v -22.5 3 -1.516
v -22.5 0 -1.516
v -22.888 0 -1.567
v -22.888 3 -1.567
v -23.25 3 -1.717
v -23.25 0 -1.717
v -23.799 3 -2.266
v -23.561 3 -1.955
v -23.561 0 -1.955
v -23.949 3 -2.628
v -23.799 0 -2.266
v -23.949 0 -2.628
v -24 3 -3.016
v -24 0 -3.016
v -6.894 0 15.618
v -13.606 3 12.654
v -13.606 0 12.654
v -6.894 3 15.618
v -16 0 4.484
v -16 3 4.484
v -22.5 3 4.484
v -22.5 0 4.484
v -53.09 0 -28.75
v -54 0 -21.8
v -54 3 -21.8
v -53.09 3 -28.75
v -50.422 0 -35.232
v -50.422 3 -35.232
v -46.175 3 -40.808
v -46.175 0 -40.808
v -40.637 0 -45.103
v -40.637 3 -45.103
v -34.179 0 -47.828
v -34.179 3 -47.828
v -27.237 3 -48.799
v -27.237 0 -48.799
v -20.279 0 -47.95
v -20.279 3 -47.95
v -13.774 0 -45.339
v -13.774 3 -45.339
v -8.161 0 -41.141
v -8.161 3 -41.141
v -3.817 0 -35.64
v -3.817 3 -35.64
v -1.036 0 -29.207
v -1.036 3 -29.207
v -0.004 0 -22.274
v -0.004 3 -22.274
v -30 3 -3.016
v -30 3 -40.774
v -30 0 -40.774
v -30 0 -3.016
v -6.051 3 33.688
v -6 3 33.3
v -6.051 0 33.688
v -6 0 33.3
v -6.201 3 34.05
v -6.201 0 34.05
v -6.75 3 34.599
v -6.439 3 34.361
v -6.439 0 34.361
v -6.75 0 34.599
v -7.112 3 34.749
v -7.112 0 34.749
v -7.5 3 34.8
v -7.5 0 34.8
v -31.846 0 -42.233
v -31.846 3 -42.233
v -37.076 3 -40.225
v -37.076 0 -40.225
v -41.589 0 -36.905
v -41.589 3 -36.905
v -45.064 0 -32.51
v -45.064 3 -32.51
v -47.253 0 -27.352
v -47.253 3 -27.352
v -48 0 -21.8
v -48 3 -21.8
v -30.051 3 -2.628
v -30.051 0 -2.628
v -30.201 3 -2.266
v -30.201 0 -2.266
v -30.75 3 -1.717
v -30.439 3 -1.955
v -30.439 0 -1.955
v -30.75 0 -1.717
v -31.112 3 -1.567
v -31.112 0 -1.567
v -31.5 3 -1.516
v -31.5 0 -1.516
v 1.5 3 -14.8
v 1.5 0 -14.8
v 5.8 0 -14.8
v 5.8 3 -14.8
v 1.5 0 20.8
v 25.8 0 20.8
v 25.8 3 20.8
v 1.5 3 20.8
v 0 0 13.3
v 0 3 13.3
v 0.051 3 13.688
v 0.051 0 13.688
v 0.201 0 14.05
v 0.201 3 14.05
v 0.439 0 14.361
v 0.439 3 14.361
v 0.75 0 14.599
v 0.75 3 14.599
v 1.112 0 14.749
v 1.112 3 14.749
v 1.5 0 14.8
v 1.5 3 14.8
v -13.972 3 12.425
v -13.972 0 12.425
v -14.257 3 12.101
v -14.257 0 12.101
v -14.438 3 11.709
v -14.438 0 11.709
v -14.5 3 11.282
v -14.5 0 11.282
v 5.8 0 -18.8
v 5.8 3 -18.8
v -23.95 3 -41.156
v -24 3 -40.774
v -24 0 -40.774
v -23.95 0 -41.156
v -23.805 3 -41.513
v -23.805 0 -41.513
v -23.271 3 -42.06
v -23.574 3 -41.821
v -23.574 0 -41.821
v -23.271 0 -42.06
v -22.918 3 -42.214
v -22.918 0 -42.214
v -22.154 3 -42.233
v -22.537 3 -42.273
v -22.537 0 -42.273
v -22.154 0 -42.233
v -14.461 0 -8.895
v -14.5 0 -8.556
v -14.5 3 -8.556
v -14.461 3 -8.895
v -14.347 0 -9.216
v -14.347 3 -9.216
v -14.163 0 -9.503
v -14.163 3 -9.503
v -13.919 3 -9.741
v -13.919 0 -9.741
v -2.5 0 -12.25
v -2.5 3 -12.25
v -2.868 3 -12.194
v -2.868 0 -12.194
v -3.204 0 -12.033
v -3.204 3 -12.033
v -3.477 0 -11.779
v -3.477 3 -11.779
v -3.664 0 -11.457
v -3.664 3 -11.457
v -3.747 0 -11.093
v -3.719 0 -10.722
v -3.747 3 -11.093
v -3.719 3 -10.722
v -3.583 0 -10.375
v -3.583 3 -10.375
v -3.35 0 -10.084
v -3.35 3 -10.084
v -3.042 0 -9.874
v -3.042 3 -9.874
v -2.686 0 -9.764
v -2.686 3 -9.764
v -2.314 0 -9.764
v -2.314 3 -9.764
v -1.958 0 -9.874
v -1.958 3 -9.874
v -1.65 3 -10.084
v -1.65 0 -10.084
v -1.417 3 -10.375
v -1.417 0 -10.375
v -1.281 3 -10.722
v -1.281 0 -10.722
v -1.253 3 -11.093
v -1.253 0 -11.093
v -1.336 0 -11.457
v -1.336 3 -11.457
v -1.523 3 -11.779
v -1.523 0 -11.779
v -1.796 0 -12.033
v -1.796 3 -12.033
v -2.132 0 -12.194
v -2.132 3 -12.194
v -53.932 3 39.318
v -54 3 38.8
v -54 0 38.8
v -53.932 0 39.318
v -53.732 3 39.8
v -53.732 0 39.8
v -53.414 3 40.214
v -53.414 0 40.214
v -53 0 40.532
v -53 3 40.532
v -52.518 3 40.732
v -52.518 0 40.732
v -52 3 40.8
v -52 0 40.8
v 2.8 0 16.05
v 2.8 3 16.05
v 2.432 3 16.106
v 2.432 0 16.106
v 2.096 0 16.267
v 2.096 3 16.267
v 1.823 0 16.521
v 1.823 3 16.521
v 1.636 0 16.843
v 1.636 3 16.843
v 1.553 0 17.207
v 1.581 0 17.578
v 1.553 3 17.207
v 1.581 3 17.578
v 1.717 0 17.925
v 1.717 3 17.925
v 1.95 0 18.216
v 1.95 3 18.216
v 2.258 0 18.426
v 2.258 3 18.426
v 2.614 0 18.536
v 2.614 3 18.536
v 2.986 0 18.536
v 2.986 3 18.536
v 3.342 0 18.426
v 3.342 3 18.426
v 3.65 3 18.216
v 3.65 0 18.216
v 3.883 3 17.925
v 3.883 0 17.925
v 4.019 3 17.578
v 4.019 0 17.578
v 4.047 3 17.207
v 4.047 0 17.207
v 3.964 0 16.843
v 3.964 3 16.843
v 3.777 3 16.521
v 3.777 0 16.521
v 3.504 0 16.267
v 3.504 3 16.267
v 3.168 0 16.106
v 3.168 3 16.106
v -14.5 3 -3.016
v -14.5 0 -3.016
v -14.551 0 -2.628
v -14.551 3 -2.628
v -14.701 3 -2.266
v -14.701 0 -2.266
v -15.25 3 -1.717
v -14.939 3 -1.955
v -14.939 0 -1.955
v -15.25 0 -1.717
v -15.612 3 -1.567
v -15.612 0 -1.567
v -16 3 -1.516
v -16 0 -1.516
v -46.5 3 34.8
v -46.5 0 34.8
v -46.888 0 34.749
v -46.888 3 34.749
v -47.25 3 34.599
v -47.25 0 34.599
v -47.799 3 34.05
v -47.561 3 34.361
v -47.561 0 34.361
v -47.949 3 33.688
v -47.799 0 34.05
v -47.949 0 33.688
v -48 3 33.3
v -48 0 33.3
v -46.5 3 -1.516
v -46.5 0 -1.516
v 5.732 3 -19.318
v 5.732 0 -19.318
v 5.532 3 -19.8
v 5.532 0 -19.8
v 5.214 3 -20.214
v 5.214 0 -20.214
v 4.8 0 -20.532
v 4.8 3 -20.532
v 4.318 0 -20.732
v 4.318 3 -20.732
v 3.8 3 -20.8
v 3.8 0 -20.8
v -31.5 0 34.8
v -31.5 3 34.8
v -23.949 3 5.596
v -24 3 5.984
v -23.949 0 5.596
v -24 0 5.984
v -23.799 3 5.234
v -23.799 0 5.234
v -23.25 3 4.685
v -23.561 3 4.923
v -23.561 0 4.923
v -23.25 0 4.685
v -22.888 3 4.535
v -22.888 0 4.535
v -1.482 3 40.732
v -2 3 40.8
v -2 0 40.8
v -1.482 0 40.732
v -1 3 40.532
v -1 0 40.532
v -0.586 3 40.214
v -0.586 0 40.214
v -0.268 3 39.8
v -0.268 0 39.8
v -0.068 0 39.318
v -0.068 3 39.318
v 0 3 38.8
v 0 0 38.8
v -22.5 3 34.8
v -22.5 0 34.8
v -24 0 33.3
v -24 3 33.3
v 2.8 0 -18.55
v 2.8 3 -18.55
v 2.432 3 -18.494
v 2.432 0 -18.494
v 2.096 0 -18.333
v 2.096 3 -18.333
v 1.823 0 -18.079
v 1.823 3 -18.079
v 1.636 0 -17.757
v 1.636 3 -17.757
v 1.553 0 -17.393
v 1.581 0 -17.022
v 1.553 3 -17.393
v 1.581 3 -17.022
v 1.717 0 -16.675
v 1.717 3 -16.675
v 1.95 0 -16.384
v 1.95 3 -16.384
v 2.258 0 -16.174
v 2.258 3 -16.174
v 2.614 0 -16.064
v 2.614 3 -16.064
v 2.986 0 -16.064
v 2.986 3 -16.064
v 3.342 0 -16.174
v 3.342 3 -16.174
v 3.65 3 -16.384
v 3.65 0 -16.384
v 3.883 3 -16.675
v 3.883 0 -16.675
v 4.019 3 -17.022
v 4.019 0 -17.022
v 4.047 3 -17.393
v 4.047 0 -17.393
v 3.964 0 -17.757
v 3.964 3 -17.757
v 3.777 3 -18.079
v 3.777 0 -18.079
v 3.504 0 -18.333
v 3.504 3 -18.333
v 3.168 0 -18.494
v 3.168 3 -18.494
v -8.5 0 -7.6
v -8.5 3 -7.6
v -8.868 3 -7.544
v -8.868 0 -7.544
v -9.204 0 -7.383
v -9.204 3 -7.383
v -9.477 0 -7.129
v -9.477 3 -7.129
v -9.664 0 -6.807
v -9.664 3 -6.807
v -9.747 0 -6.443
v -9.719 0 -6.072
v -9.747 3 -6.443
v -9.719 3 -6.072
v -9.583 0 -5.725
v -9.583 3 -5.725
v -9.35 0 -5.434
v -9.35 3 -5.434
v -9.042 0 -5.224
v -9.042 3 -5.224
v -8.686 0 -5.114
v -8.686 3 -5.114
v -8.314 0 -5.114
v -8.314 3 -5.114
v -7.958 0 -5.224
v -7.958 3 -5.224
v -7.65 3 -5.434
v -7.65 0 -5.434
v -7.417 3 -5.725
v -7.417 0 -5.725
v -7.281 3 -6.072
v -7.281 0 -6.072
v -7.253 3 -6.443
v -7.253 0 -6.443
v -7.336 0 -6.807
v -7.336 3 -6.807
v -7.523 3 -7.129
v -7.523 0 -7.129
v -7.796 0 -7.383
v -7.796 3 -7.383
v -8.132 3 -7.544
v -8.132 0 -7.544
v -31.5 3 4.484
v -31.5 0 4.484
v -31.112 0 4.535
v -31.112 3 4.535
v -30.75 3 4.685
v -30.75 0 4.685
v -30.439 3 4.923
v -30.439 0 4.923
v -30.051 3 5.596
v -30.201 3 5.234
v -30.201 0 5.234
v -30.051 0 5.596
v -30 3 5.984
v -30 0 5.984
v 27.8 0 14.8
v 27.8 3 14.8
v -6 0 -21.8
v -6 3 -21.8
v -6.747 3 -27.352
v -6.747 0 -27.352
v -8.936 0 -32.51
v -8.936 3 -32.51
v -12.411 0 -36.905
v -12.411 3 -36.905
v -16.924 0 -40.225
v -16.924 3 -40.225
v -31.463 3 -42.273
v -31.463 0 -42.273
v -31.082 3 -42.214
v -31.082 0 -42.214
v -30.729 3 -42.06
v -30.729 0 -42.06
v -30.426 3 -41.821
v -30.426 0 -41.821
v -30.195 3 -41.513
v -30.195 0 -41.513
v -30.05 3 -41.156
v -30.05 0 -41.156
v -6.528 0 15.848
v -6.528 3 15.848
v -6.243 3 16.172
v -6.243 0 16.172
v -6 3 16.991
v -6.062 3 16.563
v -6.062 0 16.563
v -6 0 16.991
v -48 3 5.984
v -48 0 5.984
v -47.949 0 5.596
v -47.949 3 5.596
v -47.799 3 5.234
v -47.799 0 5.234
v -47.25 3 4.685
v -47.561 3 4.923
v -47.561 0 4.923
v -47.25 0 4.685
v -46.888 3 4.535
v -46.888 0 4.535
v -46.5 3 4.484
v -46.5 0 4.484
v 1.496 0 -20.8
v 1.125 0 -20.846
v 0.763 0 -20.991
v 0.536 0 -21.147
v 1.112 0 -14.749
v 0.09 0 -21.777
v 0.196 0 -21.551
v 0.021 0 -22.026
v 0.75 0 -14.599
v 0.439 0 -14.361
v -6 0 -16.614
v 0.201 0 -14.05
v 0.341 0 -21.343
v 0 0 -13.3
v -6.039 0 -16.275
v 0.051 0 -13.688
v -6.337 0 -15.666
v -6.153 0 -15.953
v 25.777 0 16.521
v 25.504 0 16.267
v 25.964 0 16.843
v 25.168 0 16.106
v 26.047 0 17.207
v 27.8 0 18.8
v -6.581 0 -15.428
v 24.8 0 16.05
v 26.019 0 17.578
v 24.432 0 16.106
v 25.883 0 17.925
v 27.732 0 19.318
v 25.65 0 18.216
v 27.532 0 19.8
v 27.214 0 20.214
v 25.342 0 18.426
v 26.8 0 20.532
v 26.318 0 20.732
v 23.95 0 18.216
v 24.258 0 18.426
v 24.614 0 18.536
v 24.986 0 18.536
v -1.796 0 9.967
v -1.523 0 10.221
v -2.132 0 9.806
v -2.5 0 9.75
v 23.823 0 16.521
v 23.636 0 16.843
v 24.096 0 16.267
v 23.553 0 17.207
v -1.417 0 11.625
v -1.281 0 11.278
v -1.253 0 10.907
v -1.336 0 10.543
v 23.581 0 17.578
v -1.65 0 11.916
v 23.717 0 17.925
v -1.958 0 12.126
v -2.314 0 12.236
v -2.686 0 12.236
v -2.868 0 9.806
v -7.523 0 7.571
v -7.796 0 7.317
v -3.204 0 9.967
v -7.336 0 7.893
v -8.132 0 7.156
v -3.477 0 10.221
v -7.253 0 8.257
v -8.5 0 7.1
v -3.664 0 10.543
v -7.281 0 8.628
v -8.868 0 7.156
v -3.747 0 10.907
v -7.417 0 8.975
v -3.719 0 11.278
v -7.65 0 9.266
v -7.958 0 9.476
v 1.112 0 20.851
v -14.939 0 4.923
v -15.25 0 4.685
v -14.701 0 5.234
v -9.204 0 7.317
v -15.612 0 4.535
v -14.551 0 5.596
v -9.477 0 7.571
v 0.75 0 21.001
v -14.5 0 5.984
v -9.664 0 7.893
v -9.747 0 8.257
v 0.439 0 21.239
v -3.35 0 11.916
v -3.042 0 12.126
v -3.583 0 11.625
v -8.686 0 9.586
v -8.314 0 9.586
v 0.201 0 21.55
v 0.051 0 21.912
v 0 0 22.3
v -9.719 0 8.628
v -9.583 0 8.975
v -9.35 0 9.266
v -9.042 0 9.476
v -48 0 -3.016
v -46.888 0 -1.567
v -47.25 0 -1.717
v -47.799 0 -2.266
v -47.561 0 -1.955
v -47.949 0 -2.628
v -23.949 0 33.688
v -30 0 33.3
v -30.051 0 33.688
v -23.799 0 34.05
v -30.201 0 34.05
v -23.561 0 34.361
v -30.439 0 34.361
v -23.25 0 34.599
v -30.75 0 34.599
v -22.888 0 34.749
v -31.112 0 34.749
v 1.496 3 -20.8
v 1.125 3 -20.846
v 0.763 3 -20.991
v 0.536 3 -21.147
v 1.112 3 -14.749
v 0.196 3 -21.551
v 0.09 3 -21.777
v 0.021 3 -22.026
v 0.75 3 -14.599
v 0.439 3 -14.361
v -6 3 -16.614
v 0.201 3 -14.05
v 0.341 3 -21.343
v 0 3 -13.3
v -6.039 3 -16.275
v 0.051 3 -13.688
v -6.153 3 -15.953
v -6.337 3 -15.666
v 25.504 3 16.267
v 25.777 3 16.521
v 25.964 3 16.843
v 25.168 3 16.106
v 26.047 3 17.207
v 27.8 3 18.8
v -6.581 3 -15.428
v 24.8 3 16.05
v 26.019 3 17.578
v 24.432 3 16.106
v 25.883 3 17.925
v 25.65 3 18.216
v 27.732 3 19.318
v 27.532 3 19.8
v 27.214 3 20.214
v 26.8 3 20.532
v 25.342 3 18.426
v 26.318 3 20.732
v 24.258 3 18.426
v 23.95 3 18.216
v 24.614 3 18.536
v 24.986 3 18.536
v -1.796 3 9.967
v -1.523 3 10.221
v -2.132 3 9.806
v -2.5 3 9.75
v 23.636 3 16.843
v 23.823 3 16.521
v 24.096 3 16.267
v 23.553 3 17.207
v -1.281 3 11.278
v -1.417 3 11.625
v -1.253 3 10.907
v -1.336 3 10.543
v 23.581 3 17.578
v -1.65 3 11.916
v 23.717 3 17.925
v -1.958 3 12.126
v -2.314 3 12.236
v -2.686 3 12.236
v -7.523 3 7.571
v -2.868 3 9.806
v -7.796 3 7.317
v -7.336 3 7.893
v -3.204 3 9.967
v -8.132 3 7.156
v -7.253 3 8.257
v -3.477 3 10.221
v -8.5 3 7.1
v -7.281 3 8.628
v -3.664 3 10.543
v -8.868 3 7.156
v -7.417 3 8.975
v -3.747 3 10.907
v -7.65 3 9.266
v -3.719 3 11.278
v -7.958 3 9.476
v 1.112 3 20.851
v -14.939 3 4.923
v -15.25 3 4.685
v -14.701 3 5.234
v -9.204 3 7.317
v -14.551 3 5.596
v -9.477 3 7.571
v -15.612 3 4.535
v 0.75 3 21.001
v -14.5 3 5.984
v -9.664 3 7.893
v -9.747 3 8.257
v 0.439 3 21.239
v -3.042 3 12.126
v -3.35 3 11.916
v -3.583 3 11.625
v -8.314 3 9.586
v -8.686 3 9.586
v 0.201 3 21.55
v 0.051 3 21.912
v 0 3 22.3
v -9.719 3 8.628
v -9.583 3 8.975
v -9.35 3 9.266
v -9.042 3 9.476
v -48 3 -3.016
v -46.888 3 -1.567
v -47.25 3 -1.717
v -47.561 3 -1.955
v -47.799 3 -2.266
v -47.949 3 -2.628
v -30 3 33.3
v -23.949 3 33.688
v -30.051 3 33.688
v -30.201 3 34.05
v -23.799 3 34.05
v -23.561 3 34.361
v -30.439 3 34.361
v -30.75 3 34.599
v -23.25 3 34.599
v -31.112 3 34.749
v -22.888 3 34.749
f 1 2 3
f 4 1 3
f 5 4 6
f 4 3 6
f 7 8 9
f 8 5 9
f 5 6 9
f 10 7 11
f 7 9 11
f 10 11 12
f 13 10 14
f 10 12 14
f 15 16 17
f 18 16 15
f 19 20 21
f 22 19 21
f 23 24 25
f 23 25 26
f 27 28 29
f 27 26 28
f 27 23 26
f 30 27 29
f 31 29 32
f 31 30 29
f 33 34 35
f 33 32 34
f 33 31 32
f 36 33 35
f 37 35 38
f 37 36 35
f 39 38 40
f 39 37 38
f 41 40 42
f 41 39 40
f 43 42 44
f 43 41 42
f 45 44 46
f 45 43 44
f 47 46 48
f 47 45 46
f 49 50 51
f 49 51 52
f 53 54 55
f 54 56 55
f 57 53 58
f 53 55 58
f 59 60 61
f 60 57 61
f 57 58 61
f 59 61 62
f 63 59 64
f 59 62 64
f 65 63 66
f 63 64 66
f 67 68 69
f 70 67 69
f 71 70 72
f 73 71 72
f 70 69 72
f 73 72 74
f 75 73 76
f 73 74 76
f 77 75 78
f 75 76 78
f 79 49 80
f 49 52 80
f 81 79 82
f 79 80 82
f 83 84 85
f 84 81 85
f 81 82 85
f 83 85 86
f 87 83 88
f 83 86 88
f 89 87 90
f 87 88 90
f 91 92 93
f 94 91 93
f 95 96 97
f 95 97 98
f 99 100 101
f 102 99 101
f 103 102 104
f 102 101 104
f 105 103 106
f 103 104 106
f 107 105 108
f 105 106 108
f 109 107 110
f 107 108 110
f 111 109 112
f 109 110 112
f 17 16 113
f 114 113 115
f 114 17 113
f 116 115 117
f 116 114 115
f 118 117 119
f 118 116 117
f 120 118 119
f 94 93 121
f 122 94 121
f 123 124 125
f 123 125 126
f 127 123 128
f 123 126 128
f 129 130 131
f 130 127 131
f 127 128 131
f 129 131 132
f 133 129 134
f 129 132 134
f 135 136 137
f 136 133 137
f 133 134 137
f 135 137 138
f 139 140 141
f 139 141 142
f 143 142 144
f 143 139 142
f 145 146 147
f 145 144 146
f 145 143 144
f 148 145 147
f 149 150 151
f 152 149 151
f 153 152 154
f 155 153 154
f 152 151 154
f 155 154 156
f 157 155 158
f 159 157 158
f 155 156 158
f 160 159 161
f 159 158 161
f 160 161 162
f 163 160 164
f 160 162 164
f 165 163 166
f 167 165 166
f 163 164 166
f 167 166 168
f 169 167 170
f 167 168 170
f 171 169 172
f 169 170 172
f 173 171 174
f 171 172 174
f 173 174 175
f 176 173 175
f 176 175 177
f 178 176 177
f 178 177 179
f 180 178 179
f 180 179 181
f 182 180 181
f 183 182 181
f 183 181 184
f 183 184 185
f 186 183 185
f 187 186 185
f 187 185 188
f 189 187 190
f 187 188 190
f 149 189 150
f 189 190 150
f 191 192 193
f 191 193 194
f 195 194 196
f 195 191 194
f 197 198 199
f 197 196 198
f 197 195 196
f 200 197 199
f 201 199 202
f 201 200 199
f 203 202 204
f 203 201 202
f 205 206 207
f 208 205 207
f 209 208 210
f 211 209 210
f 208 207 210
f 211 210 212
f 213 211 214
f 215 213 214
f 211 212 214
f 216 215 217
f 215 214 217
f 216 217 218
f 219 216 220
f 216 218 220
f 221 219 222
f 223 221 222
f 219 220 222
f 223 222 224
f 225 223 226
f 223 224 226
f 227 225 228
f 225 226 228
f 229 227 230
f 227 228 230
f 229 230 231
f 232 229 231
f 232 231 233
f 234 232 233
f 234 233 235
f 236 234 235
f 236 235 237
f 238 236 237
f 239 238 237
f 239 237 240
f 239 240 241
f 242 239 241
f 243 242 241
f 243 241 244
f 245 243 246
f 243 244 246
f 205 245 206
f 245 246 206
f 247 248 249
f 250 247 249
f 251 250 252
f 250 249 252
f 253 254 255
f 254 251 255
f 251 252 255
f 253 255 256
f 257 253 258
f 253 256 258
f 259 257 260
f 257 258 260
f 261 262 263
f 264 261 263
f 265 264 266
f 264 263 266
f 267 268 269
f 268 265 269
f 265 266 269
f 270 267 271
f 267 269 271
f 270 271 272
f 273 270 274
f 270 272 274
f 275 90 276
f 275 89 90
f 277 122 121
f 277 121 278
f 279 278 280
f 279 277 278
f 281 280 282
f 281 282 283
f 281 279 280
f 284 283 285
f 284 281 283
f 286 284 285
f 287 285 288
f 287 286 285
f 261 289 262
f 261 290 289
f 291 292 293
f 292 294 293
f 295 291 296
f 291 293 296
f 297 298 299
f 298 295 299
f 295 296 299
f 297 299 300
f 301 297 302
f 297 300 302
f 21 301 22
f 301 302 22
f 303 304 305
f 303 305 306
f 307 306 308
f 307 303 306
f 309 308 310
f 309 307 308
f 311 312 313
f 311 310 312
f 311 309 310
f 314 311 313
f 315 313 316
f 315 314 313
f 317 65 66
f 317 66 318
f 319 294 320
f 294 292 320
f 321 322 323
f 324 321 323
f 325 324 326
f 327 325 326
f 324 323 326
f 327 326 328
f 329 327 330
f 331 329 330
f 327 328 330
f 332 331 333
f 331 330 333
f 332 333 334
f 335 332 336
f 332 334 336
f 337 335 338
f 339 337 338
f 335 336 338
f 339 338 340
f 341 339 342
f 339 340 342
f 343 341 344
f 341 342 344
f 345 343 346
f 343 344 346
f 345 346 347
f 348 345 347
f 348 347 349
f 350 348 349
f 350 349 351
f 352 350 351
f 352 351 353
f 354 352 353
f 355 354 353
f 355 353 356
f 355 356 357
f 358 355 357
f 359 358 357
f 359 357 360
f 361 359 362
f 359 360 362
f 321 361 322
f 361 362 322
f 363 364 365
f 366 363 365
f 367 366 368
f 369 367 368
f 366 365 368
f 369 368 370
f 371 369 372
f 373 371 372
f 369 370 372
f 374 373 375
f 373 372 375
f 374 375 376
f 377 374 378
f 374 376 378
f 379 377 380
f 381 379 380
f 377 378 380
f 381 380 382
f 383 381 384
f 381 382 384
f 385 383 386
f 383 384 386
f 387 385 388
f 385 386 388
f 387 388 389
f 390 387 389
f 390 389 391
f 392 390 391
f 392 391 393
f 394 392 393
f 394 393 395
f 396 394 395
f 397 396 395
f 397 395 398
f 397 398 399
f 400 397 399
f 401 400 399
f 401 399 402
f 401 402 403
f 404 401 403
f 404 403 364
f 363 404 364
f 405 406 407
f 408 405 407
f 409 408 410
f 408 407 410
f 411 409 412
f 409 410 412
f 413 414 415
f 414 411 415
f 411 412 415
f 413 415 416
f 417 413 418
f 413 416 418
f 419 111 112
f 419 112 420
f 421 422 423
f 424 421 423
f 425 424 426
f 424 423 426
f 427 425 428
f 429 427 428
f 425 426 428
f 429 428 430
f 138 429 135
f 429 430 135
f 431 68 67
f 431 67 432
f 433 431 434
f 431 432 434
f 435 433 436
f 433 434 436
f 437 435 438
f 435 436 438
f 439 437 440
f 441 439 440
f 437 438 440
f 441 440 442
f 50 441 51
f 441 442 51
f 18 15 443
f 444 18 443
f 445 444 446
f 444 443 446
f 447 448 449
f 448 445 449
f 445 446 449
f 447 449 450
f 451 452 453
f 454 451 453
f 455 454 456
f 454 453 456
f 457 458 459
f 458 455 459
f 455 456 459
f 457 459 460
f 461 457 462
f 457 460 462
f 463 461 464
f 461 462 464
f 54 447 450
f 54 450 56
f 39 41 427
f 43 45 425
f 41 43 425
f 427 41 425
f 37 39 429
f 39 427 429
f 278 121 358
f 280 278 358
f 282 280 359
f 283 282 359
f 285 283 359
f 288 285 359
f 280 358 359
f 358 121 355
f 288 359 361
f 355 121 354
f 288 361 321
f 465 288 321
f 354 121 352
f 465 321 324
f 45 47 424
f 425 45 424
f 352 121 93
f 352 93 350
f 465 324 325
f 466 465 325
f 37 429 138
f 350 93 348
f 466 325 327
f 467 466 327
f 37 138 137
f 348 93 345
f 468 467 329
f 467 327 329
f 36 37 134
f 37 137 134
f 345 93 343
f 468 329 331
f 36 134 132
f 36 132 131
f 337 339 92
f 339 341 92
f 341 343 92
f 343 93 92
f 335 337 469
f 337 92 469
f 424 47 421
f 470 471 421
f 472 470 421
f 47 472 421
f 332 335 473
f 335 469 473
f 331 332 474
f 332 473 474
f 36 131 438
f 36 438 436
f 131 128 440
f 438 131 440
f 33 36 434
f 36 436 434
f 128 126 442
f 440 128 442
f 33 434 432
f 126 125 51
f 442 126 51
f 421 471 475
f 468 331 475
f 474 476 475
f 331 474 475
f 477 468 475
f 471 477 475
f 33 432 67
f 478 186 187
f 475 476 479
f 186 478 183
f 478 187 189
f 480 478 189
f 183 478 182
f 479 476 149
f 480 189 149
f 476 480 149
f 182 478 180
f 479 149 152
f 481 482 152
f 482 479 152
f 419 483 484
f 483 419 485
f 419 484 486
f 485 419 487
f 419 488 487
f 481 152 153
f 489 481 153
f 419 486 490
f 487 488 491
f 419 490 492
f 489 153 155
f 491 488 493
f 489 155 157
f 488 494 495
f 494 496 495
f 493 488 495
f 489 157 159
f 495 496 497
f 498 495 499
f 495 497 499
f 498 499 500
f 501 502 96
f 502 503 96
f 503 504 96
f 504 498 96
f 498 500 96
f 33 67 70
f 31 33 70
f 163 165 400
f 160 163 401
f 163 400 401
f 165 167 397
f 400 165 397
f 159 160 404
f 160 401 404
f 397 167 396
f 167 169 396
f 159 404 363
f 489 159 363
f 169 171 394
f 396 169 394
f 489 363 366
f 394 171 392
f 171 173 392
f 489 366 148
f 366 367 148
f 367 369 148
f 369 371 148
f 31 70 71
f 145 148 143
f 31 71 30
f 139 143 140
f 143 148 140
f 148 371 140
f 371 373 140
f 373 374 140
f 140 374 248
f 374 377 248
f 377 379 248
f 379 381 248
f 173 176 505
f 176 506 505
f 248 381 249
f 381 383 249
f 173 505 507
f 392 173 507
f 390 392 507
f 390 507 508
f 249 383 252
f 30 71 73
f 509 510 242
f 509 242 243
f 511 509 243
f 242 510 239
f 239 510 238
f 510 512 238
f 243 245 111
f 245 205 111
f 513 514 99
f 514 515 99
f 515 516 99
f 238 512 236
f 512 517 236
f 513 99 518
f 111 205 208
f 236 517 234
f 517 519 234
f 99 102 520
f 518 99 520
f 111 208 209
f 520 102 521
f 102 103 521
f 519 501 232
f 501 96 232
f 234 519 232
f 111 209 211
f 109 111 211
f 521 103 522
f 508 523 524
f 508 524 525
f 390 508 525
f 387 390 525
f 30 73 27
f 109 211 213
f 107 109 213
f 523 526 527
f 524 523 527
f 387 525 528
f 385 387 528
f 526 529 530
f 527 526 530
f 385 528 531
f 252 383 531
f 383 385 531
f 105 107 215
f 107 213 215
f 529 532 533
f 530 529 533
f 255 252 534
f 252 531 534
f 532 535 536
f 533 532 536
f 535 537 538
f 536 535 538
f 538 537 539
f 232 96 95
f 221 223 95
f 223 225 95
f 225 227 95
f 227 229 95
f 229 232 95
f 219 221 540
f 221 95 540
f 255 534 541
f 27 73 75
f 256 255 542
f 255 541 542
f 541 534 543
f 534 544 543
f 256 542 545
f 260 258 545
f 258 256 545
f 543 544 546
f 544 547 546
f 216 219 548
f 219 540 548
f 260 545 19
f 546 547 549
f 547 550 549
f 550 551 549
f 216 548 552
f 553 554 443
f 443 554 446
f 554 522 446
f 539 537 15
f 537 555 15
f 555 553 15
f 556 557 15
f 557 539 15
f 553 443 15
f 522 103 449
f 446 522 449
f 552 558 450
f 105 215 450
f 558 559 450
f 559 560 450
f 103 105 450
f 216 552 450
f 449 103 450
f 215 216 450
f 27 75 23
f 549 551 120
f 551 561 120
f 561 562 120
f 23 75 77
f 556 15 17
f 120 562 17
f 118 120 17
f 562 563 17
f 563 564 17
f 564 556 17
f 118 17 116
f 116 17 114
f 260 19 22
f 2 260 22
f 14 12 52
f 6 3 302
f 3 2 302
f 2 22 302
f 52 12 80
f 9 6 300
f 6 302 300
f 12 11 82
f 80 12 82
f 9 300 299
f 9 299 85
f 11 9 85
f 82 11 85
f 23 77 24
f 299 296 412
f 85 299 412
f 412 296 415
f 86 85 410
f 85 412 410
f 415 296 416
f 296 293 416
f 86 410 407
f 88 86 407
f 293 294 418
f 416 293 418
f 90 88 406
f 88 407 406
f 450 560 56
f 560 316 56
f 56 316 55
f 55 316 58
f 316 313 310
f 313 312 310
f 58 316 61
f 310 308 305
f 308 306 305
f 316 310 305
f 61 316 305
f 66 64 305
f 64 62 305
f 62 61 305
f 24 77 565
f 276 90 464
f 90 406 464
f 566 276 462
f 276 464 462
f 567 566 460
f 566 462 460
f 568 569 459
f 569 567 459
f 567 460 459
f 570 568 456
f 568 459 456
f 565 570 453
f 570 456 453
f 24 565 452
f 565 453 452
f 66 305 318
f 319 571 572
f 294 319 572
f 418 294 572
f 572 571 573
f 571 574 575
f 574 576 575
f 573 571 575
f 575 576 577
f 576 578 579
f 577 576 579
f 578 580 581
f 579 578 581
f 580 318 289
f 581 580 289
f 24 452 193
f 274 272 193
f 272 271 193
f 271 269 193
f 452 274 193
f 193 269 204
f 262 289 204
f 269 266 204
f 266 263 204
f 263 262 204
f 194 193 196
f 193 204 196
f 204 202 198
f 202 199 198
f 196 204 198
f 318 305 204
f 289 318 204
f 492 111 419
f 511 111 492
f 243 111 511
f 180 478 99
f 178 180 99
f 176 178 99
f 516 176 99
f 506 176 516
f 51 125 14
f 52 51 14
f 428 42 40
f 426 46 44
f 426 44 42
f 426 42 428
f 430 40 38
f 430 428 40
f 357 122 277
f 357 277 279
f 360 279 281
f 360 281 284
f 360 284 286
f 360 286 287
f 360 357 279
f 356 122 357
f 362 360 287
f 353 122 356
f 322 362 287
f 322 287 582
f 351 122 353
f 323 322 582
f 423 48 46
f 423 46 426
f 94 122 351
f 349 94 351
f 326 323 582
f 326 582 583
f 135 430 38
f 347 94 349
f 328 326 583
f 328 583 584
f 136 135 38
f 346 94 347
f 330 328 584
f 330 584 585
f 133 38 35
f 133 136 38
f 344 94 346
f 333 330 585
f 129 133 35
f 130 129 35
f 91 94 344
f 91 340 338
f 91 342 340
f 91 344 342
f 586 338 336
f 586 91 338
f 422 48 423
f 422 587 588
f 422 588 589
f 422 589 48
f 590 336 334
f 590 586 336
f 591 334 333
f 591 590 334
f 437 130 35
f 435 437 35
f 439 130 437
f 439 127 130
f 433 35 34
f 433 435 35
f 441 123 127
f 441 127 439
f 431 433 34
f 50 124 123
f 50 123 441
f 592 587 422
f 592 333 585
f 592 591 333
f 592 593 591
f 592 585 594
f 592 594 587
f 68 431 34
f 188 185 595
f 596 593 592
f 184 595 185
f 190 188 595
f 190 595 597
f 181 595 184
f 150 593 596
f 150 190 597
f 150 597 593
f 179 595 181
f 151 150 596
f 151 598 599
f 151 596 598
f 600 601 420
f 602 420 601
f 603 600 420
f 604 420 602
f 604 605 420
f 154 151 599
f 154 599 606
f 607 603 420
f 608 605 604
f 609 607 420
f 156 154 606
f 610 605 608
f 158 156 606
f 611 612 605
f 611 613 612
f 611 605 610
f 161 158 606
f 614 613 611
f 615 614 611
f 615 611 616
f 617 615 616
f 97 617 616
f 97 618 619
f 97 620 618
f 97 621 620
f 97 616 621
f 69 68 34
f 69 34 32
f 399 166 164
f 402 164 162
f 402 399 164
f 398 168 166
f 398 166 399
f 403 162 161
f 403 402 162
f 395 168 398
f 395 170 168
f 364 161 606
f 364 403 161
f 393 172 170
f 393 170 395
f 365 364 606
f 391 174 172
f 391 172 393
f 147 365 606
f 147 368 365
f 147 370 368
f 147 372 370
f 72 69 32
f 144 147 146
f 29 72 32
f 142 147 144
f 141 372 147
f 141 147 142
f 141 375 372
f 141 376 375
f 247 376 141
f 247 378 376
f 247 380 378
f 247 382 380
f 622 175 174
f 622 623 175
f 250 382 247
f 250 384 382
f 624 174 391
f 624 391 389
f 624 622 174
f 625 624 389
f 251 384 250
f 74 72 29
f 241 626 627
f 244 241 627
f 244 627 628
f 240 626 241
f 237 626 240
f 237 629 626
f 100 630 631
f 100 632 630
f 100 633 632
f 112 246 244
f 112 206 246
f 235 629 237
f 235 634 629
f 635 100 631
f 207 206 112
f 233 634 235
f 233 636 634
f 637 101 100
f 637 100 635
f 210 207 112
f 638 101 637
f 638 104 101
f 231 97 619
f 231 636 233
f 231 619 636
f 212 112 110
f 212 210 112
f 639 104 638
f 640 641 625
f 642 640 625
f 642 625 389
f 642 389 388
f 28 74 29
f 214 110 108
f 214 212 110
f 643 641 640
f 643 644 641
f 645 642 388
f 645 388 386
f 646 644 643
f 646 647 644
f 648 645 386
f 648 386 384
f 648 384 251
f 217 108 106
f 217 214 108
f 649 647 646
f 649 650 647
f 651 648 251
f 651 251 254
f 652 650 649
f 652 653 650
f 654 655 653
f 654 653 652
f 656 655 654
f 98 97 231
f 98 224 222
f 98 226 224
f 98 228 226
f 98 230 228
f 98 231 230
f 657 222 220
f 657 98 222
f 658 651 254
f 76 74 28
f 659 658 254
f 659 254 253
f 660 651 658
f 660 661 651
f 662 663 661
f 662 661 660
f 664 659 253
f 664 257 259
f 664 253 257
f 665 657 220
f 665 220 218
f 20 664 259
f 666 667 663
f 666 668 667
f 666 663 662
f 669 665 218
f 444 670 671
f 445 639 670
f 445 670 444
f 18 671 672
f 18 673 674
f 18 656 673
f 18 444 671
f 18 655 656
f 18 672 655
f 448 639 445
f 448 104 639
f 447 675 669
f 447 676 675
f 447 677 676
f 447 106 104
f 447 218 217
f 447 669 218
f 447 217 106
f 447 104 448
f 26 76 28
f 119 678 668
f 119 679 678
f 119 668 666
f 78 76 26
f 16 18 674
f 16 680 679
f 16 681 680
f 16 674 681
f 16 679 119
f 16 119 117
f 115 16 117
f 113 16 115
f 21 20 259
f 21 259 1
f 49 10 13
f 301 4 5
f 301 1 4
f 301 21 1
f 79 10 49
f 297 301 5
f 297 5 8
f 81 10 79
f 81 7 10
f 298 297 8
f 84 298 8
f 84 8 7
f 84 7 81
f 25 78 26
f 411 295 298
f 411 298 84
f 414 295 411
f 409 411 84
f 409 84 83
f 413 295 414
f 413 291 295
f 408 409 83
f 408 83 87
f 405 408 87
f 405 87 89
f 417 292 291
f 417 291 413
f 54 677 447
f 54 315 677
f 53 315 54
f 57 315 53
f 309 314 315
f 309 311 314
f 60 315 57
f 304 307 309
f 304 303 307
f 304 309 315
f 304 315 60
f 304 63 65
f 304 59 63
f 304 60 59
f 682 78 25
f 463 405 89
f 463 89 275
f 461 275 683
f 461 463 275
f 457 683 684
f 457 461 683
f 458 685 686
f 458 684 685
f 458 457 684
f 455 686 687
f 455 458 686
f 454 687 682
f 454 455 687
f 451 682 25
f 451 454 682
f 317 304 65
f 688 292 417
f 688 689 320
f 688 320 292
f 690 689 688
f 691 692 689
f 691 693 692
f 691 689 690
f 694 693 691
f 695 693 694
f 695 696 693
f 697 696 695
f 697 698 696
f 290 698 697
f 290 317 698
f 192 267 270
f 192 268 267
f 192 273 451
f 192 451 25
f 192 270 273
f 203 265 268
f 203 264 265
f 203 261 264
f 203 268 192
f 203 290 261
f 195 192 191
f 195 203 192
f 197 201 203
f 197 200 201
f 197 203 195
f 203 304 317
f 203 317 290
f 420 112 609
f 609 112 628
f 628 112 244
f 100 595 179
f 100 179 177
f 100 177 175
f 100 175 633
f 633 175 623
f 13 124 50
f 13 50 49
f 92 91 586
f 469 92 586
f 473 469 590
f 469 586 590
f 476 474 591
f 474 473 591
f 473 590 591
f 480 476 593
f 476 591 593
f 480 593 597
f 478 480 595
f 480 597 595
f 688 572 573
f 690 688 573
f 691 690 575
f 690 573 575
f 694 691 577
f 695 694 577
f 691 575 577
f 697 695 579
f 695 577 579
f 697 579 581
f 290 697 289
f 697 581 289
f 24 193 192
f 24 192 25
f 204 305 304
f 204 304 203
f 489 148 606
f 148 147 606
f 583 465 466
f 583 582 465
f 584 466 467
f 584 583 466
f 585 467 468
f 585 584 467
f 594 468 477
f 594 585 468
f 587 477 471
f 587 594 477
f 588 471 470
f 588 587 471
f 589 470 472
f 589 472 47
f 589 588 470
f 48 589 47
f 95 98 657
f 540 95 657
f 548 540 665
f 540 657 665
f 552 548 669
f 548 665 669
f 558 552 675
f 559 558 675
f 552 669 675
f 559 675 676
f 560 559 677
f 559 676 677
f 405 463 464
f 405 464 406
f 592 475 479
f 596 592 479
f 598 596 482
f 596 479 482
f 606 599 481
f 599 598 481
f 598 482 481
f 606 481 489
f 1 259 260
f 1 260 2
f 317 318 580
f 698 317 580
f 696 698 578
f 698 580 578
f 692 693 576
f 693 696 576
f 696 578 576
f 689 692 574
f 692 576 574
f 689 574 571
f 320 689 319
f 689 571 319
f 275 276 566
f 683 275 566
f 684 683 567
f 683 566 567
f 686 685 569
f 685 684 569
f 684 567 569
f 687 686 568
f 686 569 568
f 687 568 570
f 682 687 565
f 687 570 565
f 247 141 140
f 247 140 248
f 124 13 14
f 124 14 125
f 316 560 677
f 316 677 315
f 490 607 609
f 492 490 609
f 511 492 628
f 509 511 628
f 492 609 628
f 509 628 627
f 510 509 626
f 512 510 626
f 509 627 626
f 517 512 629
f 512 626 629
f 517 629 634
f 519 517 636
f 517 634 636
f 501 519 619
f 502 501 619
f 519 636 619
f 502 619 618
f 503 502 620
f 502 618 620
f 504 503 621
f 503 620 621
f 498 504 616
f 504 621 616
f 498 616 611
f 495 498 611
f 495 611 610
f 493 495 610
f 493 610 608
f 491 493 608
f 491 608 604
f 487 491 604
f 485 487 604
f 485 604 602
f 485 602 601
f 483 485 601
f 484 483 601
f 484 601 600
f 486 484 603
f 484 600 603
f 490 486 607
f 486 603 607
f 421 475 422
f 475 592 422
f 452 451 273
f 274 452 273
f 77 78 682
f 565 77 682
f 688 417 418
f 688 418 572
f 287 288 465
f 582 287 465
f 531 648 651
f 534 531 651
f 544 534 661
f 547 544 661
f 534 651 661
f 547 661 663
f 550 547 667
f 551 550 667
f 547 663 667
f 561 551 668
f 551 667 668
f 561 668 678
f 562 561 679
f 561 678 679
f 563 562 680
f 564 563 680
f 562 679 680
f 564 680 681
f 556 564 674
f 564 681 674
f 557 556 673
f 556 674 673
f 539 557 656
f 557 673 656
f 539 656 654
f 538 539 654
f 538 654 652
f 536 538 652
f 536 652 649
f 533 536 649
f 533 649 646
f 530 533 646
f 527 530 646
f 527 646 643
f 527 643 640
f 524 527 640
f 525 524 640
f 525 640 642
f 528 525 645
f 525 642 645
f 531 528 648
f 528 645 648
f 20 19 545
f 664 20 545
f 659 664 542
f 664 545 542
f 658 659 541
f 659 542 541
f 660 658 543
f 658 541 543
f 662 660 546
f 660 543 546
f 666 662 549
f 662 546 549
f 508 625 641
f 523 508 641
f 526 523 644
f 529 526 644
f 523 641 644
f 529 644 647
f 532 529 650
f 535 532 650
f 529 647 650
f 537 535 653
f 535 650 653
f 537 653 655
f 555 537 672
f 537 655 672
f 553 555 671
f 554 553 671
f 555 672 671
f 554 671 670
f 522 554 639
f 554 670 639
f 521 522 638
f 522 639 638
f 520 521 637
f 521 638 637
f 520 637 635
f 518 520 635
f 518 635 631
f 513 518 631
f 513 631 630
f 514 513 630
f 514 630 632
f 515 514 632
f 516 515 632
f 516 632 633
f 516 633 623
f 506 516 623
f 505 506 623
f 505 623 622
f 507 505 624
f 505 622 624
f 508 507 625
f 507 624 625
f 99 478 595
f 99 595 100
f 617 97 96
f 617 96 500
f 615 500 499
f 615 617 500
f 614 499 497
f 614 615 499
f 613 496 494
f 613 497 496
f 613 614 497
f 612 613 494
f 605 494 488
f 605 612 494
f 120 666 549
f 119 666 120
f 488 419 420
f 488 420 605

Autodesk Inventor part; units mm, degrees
ref_plane "YZ Plane" through (0, 0, 0) normal (1, 0, 0) x (0, 1, 0)
ref_plane "XZ Plane" through (0, 0, 0) normal (0, 1, 0) x (-1, 0, 0)
ref_plane "XY Plane" through (0, 0, 0) normal (0, 0, 1) x (1, 0, 0)
sketch "Sketch1" plane through (0, 0, 0) normal (0, 1, 0) x (-1, 0, 0)
  line L0 (0, 0) -> (0, -14.8)
  line L1 (0, -14.8) -> (-5.8, -14.8)
  line L2 (-5.8, -14.8) -> (-5.8, -20.8)
  line L3 (-5.8, -20.8) -> (0, -20.8)
  line L4 (0, 0) -> (0, 14.8)
  line L5 (0, 14.8) -> (-27.8, 14.8)
  line L6 (-27.8, 14.8) -> (-27.8, 20.8)
  line L7 (-27.8, 20.8) -> (0, 20.8)
  line L8 (0, 20.8) -> (0, 40.8)
  line L9 (0, 40.8) -> (54, 40.8)
  line L10 (0, -20.8) -> (0, -21.8)
  line L11 (54, 40.8) -> (54, -21.8)
  arc A0 (0, -21.8) -> (54, -21.8) centre (27, -21.8) ccw
  line L12 (-27.8, 17.3) -> (2.5, 17.3) construction
  line L13 (2.5, 17.3) -> (2.5, -17.3) construction
  line L14 (2.5, -17.3) -> (-5.8, -17.3) construction
  line L15 (0, 0) -> (2.5, 0) construction
  line L16 (2.5, 0) -> (8.5, 0) construction
  line L17 (8.5, -6.35) -> (8.5, 8.35) construction
  line L18 (-27.8, 14.8) -> (-5.8, -14.8) construction
  line L19 (-16.8, 0) -> (-21.8, 0) construction
  point P0 (-2.8, -17.3)
  point P1 (-2.8, 17.3)
  point P2 (-24.8, 17.3)
  point P3 (2.5, 11)
  point P4 (2.5, -11)
  dimension "d0" = 20
  dimension "d1" = 6
  dimension "d2" = 6
  dimension "d4" = 54
  dimension "d5" = 1
  dimension "d7" = 2.5
  dimension "d8" = 2.5
  dimension "d9" = 5.3
  dimension "d10" = 3
  dimension "d11" = 34.6
  dimension "d12" = 11
  dimension "d13" = 11
  dimension "d14" = 5.3
  dimension "d15" = 22
  dimension "d16" = 3
  dimension "d19" = 6
  dimension "d20" = 14.7
  dimension "d21" = 6.35
  dimension "d53" = 5
extrude "Extrusion1" add sketch "Sketch1" along normal blind 3
hole "Hole1" at (2.8, 0, -17.3) at (2.8, 0, 17.3) at (24.8, 0, 17.3) at (-2.5, 0, 11) at (-2.5, 0, -11) at (-8.5, 0, 8.35) at (-8.5, 0, -6.35) direction (0, 1, 0) diameter 2.5 end through all
fillet "ManufacturingFillet" radius 1.5 4 edges at (0, 1.5, -20.8) (0, 1.5, -14.8) (0, 1.5, 14.8) (0, 1.5, 20.8)
fillet "Fillet2" radius 2 4 edges at (5.8, 1.5, -20.8) (27.8, 1.5, 20.8) (0, 1.5, 40.8) (-54, 1.5, 40.8)
sketch "InteriorSketch" plane through (0, 3, 0) normal (0, 1, 0) x (1, 0, 0)
  arc A0 (-54, -38.8) -> (-52, -40.8) centre (-52, -38.8) ccw projected
  line L0 (-52, -40.8) -> (-2, -40.8) projected
  arc A1 (-2, -40.8) -> (0, -38.8) centre (-2, -38.8) ccw projected
  line L1 (0, -38.8) -> (0, -22.3) projected
  arc A2 (1.5, -20.8) -> (0, -22.3) centre (1.5, -22.3) ccw projected
  line L2 (1.5, -20.8) -> (25.8, -20.8) projected
  arc A3 (25.8, -20.8) -> (27.8, -18.8) centre (25.8, -18.8) ccw projected
  line L3 (27.8, -18.8) -> (27.8, -14.8) projected
  line L4 (27.8, -14.8) -> (1.5, -14.8) projected
  arc A4 (0, -13.3) -> (1.5, -14.8) centre (1.5, -13.3) ccw projected
  line L5 (0, -13.3) -> (0, 13.3) projected
  arc A5 (1.5, 14.8) -> (0, 13.3) centre (1.5, 13.3) ccw projected
  line L6 (1.5, 14.8) -> (5.8, 14.8) projected
  line L7 (5.8, 14.8) -> (5.8, 18.8) projected
  arc A6 (5.8, 18.8) -> (3.8, 20.8) centre (3.8, 18.8) ccw projected
  line L8 (3.8, 20.8) -> (1.4956, 20.8) projected
  arc A7 (-0.0042, 22.2737) -> (1.4956, 20.8) centre (1.4956, 22.3) ccw projected
  arc A8 (-0.0042, 22.2737) -> (-54, 21.8) centre (-27, 21.8) ccw projected
  line L9 (-54, 21.8) -> (-54, -38.8) projected
  circle A9 centre (-8.5, -8.35) radius 1.25 projected
  circle A10 centre (-2.5, -11) radius 1.25 projected
  circle A11 centre (2.8, -17.3) radius 1.25 projected
  circle A12 centre (2.8, 17.3) radius 1.25 projected
  circle A13 centre (24.8, -17.3) radius 1.25 projected
  circle A14 centre (-2.5, 11) radius 1.25 projected
  circle A15 centre (-8.5, 6.35) radius 1.25 projected
  line L10 (-14.5, 9.2909) -> (-14.5, -12.2592)
  line L11 (-14.5, -12.2592) -> (-6, -16.0133)
  line L12 (-6, -16.0133) -> (-6, -34.8)
  line L13 (-6, -34.8) -> (-48, -34.8)
  circle A16 centre (-2.5, 11) radius 1.25 construction
  line L14 (-8.5, 6.35) -> (-2.5, 11) construction
  line L15 (-8.5, -8.35) -> (-2.5, -11) construction
  line L16 (-14.5, 9.2909) -> (-6, 15.8784)
  line L17 (-6, 15.8784) -> (-6, 21.8)
  line L18 (-6, 15.8784) -> (-6, 21.8)
  arc A17 (-6, 21.8) -> (-48, 21.8) centre (-27, 21.8) ccw
  line L19 (-48, 21.8) -> (-48, -34.8)
  line L20 (-6, 21.8) -> (-48, 21.8) construction
  line L21 (-27, -34.8) -> (-27, 42.8) construction
  line L22 (-14.5, -1.4841) -> (-48, -1.4841) construction
  line L23 (-14.5, 1.5159) -> (-24, 1.5159)
  line L24 (-24, 1.5159) -> (-24, 42.5846)
  line L25 (-30, 42.5846) -> (-30, 1.5159)
  line L26 (-30, 1.5159) -> (-48, 1.5159)
  line L27 (-48, -4.4841) -> (-30, -4.4841)
  line L28 (-30, -4.4841) -> (-30, -34.8)
  line L29 (-14.5, -4.4841) -> (-24, -4.4841)
  line L30 (-24, -4.4841) -> (-24, -34.8)
  line L31 (-30, 1.5159) -> (-24, 1.5159) construction
  line L32 (-30, 1.5159) -> (-30, -4.4841) construction
  point P0 (0, 0)
  point P1 (-14.5, -1.4841)
  point P2 (-27, -1.4841)
  point P3 (-30, -1.4841)
  point P4 (-27, 1.5159)
  dimension "d31" = 6
  dimension "d32" = 6
  dimension "d34" = 6
  dimension "d38" = 6
  dimension "d39" = 6
  dimension "d44" = 6
  dimension "d48" = 6
  dimension "d49" = 6
extrude "Extrusion3" cut sketch "InteriorSketch" against normal through all contours L10 L23 L24 A17 L17 L16 | L10 L11 L12 L13 L30 L29 | L25 L26 L19 A17 | L13 L19 L27 L28
fillet "Fillet3" radius 1.5 18 edges at (-24, 1.5, 34.8) (-6, 1.5, 34.8) (-24, 1.5, 4.4841) (-14.5, 1.5, 4.4841) (-6, 1.5, 16.0133) (-14.5, 1.5, 12.2592) (-14.5, 1.5, -9.2909) (-6, 1.5, -15.8784) (-24, 1.5, -42.5846) (-14.5, 1.5, -1.5159) (-24, 1.5, -1.5159) (-30, 1.5, -1.5159) (-30, 1.5, 4.4841) (-30, 1.5, 34.8) (-48, 1.5, 34.8) (-48, 1.5, 4.4841) (-48, 1.5, -1.5159) (-30, 1.5, -42.5846)
ref_plane "Work Plane3" through (19, 0, 13.3) normal (1, 0, 0) x (0, 0, -1)
ref_plane "Work Plane4" through (27.8, 0, -5.2) normal (0, 0, -1) x (-1, 0, 0)
equation "\"d0\" = head_back_length"
equation "\"d1\" = fix_width"
equation "\"d2\" = fix_width"
equation "\"d4\" = head_height"
equation "\"d5\" = head_forward - 0.5 * head_height"
equation "\"d7\" = hole_2_intern"
equation "\"d8\" = hole_2_intern"
equation "\"d9\" = hole_side_2_hole_top"
equation "\"d10\" = hole_2_extern"
equation "\"d11\" = side_2_side_hole"
equation "\"d12\" = 0.5 * hole_2_hole"
equation "\"d13\" = 0.5 * hole_2_hole"
equation "\"d14\" = hole_side_2_hole_top"
equation "\"d15\" = hole_2_hole"
equation "\"d16\" = hole_2_extern"
equation "\"d19\" = camera_holes_offset_z"
equation "\"d20\" = camera_holes_dist"
equation "\"d21\" = 0.5 * camera_holes_dist - camera_holes_offset_x"
equation "\"d17\" = plate_thickness"
equation "\"d31\" = structure_width"
equation "\"d32\" = structure_width"
equation "\"d34\" = structure_width"
equation "\"d38\" = structure_width"
equation "\"d39\" = structure_width"
equation "\"d44\" = structure_width"
equation "\"d48\" = structure_width"
equation "\"d49\" = structure_width"
equation "\"head_back_length\" = 20"
equation "\"head_height\" = 54"
equation "\"head_forward\" = 28"
equation "\"fix_width\" = 6"
equation "\"fix_2_fix\" = 29.1"
equation "\"hole_2_intern\" = hole_2_servo - fix_2_servo_margin"
equation "\"fix_2_servo_margin\" = 0.3"
equation "\"hole_2_servo\" = 2.8"
equation "\"side_2_side_hole\" = 34.6"
equation "\"hole_side_2_hole_top\" = 5.3"
equation "\"hole_2_extern\" = 3"
equation "\"hole_2_hole\" = 22"
equation "\"plate_thickness\" = 3"
equation "\"camera_holes_offset_z\" = 6"
equation "\"camera_holes_dist\" = 14.7"
equation "\"camera_holes_offset_x\" = 1"
equation "\"structure_width\" = 6"
properties part number "base_head" material "Aluminum 6061"
